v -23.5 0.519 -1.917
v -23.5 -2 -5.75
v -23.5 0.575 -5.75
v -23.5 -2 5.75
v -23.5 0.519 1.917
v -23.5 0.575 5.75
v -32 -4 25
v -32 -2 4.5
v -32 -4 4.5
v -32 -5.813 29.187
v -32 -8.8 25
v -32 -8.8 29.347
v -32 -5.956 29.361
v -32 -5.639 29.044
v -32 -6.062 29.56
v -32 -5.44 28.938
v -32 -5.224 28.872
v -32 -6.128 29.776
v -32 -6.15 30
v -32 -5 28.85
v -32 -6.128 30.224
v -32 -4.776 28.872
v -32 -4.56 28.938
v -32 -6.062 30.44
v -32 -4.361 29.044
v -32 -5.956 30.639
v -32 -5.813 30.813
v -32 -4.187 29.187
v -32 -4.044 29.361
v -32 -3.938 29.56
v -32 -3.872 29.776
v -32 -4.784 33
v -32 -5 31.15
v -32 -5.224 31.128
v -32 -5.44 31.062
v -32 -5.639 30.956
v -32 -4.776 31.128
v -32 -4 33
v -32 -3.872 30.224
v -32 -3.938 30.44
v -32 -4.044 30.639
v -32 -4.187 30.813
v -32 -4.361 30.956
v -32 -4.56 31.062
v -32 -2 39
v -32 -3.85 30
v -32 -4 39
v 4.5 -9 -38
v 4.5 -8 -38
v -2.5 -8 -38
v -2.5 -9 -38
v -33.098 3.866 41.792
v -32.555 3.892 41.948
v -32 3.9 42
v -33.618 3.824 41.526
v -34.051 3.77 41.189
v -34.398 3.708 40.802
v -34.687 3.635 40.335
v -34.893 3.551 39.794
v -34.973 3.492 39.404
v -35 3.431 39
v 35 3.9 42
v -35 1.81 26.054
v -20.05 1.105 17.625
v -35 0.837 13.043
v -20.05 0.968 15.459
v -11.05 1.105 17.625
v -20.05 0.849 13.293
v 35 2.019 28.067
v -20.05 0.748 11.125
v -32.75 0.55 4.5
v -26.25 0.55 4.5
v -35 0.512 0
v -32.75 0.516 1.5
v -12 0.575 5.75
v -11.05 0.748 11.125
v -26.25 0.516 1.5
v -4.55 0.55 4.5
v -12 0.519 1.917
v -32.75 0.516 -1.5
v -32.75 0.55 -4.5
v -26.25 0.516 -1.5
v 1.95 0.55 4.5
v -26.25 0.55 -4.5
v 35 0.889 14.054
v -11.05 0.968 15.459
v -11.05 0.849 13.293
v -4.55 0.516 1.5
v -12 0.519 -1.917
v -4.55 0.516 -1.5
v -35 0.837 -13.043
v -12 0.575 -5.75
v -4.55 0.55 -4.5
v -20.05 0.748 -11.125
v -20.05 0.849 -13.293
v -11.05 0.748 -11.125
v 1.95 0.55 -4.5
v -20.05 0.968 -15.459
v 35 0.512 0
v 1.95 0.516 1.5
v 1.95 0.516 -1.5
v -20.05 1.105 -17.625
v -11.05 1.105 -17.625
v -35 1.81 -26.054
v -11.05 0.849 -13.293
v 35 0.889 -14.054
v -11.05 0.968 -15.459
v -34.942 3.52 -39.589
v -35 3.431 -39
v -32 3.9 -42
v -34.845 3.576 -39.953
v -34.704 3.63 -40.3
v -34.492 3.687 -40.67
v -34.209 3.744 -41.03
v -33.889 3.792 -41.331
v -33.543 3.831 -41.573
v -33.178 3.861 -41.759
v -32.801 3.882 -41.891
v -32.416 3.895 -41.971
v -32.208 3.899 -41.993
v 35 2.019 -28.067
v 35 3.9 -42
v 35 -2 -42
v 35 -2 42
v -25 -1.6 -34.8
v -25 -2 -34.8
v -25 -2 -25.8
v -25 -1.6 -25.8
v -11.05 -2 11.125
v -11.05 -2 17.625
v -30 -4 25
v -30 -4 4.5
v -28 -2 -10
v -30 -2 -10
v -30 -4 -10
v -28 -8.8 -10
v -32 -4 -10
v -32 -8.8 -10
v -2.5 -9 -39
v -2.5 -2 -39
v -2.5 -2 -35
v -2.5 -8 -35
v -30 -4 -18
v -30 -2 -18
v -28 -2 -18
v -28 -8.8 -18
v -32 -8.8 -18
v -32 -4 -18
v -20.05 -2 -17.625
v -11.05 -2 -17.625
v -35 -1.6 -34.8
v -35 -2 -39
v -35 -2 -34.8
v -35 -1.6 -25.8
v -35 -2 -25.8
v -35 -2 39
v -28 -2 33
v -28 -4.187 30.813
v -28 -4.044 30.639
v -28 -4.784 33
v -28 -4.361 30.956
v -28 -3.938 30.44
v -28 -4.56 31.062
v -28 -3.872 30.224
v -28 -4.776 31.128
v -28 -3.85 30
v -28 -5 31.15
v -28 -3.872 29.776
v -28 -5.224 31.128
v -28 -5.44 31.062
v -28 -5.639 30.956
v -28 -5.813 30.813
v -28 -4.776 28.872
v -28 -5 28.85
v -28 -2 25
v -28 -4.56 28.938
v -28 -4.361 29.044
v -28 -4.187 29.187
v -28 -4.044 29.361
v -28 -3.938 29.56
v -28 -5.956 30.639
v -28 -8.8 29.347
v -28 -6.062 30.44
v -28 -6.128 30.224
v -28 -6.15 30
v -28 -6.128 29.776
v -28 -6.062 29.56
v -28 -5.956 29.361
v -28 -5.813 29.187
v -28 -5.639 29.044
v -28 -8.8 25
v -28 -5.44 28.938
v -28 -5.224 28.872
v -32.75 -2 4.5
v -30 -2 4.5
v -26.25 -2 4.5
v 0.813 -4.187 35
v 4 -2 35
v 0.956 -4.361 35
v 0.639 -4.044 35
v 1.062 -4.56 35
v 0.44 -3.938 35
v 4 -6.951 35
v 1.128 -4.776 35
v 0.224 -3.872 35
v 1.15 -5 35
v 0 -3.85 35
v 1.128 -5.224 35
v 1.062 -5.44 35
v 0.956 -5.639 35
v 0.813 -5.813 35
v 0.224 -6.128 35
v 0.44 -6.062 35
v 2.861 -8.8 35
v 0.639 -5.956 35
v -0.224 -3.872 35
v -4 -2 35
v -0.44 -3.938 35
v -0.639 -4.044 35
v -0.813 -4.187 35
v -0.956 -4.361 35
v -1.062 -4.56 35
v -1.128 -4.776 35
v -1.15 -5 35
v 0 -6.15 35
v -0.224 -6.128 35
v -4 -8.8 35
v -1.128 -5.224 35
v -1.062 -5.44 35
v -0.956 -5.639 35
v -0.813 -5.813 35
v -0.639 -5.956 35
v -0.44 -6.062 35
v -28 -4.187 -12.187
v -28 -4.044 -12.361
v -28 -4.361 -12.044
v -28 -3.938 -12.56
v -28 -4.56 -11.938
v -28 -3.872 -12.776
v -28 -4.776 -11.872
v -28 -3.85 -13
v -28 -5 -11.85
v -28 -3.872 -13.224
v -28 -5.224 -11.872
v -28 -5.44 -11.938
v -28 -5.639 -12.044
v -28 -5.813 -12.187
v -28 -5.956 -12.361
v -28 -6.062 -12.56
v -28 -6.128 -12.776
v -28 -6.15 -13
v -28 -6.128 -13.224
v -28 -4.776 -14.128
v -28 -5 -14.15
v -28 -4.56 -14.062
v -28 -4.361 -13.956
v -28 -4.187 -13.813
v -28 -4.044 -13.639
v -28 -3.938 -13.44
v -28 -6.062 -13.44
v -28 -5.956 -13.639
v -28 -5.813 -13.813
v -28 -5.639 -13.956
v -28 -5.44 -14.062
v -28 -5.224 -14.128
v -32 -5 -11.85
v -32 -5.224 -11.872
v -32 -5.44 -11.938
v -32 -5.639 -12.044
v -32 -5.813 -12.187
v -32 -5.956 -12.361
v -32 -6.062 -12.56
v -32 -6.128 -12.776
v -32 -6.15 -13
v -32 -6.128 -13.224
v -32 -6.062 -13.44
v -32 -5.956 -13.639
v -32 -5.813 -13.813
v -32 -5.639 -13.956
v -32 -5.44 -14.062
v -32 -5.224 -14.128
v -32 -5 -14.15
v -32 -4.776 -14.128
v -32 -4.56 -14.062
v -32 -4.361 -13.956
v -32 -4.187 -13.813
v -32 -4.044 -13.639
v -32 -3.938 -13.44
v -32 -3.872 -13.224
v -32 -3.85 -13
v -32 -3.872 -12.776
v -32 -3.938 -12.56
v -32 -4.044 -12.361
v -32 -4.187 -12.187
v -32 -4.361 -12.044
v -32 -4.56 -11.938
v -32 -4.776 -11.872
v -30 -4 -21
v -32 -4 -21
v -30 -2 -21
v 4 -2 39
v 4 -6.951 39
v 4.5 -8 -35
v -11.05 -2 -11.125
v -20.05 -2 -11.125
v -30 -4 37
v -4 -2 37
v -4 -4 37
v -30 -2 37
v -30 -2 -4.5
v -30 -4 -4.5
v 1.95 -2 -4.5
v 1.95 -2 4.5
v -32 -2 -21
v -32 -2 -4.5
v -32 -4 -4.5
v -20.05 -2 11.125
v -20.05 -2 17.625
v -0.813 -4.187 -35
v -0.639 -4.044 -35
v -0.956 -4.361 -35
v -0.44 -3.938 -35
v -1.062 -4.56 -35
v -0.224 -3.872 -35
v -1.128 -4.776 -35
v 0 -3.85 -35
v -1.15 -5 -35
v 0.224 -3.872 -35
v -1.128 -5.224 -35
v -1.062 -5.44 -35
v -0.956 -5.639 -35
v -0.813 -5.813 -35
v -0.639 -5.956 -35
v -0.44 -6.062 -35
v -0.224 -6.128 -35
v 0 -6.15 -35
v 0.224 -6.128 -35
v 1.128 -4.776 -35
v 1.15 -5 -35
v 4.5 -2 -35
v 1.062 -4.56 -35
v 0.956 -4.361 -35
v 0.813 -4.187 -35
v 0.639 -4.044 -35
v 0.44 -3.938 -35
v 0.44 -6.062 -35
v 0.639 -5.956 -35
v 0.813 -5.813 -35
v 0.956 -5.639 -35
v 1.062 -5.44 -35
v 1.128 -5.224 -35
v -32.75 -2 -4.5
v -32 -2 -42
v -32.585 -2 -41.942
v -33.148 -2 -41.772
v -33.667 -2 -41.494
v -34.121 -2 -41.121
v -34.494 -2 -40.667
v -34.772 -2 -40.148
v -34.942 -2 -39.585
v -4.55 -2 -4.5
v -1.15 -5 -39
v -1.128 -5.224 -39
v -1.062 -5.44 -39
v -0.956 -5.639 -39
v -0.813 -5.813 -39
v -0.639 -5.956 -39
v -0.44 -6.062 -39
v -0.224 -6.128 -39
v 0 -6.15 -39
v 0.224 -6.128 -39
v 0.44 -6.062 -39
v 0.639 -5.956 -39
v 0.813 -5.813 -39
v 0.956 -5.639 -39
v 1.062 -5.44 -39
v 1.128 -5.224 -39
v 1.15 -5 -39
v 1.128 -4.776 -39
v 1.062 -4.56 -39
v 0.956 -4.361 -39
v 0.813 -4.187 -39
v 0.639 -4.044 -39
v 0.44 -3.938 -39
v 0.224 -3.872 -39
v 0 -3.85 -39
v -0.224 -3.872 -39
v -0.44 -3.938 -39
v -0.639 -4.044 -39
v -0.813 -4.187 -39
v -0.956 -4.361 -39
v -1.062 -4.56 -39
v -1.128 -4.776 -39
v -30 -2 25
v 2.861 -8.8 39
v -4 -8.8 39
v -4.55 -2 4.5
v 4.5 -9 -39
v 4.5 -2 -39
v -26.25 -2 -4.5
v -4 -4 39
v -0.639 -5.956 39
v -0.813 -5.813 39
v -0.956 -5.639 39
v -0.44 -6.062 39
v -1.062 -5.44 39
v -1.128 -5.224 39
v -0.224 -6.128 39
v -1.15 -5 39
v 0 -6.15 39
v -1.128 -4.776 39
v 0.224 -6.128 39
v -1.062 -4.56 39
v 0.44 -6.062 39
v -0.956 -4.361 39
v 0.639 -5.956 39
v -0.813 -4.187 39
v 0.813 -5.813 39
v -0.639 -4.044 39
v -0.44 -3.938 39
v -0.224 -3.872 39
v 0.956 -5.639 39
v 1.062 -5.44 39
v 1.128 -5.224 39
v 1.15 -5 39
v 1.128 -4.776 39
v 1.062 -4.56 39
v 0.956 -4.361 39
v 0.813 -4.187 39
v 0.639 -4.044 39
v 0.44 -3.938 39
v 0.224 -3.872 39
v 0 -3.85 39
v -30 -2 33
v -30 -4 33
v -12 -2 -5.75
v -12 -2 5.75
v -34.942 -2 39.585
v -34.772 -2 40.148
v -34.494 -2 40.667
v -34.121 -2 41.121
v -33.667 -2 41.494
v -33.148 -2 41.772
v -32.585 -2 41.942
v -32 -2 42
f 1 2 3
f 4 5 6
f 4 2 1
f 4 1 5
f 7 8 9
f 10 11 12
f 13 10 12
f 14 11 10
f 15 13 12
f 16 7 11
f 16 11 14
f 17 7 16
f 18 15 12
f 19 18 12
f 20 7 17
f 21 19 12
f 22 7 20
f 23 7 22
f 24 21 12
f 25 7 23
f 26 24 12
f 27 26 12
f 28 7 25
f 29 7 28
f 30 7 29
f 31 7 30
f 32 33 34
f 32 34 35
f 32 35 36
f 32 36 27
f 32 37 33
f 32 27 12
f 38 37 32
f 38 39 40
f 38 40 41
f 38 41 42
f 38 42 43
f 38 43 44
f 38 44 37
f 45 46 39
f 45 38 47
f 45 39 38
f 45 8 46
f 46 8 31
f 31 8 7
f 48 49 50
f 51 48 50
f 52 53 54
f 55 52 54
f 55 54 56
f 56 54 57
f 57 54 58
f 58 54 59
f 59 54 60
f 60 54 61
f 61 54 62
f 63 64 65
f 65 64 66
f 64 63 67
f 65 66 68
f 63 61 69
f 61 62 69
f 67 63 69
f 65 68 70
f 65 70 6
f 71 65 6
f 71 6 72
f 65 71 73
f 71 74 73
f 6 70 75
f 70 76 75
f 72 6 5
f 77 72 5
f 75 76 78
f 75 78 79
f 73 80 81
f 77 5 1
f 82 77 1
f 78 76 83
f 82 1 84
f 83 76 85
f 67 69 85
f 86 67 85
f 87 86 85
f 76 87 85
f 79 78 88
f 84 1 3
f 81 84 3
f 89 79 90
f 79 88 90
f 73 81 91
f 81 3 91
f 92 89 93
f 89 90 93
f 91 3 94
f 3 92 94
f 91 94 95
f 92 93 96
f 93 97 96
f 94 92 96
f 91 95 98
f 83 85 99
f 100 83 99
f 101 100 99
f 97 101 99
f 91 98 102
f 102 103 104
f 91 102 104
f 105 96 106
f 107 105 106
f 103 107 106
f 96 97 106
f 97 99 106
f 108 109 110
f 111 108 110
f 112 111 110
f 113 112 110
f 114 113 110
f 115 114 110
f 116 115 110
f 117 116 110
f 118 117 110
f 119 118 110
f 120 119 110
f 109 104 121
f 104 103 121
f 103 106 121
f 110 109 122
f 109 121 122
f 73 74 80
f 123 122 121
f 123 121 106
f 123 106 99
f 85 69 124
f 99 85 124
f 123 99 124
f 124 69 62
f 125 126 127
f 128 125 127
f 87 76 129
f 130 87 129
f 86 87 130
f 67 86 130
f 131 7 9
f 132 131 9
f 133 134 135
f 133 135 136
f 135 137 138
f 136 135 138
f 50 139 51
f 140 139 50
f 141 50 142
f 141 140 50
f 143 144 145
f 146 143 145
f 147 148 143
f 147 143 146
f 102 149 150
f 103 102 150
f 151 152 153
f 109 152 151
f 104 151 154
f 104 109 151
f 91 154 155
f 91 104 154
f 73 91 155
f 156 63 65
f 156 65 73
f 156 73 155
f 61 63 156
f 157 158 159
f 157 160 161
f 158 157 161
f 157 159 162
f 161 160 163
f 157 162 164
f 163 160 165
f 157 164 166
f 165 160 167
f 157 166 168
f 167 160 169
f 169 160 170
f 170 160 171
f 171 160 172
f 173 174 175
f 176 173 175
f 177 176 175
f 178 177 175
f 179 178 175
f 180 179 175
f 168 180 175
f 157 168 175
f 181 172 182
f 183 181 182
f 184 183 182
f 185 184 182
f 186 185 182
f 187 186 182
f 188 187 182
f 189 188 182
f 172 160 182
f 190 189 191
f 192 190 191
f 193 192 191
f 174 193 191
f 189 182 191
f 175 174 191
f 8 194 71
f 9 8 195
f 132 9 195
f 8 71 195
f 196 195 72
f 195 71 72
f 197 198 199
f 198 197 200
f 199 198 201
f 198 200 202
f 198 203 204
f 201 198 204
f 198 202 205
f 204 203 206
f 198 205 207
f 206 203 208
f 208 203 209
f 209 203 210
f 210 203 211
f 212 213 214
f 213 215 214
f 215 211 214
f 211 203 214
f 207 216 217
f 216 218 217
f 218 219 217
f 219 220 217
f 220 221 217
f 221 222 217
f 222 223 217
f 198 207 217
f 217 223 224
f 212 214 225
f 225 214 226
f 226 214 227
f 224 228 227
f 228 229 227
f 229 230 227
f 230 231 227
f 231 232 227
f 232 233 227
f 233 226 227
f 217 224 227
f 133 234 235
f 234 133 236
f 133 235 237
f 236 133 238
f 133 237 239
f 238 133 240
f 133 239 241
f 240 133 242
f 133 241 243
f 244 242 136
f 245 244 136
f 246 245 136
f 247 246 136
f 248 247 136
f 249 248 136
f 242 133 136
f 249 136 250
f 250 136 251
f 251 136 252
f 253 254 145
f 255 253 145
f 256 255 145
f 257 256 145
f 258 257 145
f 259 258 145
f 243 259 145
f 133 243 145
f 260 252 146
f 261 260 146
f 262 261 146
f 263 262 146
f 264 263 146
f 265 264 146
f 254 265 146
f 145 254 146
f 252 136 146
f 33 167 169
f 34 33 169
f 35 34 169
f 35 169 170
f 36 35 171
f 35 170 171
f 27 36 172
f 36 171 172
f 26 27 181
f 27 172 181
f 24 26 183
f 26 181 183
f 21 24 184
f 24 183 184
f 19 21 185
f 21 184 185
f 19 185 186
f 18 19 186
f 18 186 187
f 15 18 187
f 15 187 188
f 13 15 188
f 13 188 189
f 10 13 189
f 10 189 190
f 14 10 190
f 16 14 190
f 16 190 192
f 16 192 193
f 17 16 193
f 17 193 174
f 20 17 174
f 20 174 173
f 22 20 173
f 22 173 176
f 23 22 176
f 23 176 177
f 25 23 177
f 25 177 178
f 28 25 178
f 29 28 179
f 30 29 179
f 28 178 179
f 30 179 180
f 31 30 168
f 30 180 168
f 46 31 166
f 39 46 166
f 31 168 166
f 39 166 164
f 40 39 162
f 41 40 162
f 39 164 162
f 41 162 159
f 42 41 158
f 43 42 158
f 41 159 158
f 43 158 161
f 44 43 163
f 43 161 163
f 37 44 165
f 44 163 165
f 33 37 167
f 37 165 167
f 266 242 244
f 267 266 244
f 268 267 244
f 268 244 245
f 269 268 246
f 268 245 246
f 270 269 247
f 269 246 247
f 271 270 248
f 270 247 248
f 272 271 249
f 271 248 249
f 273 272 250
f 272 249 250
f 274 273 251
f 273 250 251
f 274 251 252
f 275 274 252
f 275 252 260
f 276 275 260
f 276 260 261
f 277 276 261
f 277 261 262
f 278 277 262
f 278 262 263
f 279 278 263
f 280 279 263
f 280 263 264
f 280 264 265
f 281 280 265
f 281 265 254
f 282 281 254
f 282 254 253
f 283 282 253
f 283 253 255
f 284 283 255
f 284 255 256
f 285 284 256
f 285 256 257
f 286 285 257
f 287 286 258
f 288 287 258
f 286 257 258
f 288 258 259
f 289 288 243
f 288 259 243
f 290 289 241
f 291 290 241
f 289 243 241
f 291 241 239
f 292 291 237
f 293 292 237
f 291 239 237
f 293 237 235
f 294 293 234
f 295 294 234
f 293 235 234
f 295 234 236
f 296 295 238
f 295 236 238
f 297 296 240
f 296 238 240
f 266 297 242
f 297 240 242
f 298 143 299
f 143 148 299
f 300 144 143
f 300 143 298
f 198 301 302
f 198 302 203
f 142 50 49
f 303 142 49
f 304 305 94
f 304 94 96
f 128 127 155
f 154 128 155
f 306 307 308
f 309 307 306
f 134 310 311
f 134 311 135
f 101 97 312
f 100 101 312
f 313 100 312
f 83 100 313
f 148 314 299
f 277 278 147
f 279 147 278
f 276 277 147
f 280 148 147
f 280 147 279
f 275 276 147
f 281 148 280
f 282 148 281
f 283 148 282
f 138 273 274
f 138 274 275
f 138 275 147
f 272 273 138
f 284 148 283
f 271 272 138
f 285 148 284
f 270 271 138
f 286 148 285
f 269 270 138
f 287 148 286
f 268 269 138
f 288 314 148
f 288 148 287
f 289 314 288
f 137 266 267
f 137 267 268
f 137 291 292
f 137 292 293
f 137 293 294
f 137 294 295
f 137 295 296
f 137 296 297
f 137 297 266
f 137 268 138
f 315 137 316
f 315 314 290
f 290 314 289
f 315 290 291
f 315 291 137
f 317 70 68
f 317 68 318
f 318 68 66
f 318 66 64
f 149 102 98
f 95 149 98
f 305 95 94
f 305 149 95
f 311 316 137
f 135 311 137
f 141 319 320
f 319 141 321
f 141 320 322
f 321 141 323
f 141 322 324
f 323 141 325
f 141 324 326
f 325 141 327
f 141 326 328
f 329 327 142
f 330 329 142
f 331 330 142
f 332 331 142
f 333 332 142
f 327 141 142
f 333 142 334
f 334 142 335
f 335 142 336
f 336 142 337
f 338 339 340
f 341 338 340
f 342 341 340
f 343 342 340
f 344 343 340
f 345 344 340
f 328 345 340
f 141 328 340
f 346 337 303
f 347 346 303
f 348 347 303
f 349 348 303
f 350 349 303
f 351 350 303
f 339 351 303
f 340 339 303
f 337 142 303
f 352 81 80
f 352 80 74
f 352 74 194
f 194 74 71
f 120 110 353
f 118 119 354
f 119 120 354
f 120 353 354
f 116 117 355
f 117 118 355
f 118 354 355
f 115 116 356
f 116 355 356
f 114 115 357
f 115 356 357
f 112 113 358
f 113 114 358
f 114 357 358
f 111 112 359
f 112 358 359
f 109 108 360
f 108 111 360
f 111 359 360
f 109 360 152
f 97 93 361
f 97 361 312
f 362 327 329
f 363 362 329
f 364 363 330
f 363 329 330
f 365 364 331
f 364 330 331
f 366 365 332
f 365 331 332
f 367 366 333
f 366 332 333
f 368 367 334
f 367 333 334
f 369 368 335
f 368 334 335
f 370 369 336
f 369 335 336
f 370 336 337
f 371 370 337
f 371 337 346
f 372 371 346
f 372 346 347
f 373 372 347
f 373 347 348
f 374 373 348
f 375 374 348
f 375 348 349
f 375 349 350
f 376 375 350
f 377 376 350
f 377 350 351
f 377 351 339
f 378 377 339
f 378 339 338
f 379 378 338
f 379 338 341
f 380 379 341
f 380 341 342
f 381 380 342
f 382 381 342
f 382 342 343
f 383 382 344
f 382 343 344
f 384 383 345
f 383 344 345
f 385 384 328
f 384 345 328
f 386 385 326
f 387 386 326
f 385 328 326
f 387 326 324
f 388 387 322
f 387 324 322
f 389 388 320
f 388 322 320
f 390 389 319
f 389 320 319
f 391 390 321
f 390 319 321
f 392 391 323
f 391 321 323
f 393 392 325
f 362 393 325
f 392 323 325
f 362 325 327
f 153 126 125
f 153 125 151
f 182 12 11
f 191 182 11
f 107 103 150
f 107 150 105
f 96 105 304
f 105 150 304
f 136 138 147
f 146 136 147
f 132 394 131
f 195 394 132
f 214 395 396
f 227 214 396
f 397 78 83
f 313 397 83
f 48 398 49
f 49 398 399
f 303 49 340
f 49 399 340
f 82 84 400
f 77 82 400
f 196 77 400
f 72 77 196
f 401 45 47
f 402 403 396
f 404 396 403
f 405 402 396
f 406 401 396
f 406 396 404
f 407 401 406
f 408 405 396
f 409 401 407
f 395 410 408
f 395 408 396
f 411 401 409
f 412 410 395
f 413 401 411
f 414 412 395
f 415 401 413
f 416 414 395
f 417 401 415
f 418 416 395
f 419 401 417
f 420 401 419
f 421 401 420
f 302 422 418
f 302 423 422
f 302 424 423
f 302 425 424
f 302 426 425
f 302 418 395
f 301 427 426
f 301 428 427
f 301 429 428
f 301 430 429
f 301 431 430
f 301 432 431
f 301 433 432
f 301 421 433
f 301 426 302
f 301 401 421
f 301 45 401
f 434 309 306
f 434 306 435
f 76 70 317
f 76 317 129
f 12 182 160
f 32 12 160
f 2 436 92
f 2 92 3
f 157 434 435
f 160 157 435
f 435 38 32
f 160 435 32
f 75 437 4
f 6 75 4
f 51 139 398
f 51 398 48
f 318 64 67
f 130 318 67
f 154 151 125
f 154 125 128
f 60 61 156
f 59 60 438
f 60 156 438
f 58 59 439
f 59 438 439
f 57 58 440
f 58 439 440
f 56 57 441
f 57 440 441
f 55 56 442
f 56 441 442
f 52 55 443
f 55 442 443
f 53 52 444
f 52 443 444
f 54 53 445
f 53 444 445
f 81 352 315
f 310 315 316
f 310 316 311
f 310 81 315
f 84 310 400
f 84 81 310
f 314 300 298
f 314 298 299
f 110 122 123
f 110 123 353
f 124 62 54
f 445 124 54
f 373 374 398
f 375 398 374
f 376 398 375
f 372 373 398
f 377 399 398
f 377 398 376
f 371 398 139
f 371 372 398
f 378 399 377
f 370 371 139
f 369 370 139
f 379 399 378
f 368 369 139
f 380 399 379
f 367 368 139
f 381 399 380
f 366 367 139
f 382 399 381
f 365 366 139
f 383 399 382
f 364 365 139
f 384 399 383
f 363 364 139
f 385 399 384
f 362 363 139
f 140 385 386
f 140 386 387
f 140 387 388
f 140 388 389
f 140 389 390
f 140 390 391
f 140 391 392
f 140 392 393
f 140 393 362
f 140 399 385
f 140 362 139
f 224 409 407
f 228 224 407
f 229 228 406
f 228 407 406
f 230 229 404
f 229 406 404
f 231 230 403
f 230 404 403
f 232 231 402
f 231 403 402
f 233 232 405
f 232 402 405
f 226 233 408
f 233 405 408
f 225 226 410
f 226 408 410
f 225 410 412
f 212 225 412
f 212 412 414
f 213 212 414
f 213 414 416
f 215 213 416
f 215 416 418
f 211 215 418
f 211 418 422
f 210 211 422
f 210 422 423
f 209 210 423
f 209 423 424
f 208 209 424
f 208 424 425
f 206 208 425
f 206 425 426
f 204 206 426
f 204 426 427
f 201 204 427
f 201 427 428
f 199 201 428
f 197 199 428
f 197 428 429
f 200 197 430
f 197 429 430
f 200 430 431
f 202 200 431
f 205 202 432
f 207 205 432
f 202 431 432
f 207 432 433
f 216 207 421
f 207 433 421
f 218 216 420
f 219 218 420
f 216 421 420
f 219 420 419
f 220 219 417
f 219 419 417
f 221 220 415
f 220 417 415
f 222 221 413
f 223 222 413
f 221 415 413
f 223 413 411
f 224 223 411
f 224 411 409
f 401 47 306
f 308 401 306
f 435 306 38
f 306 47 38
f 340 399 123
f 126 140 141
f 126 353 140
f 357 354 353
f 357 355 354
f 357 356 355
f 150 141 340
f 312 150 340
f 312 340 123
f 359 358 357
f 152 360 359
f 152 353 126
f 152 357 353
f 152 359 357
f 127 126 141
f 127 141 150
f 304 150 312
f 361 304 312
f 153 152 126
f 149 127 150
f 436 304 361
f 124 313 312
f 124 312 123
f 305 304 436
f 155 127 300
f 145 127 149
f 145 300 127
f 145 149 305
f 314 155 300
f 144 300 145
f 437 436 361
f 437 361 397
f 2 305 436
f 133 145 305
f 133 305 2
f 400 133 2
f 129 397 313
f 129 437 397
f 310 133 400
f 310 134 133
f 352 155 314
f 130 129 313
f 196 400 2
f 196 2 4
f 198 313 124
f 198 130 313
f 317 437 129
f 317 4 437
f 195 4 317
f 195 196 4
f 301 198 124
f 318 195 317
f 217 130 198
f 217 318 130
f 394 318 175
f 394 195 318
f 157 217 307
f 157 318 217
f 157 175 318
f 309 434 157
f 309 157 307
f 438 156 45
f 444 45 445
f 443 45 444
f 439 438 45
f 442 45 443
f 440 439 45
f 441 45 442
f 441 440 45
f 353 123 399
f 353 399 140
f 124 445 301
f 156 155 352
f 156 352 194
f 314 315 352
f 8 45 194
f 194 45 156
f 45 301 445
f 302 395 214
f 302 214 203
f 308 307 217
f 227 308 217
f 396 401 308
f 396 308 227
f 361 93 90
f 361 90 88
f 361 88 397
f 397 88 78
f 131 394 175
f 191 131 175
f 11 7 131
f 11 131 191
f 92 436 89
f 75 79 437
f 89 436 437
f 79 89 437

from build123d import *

# Parameters (mm, degrees)
SKETCH009_W             = 84
SKETCH009_H             = 70
PAD002_DEPTH            = 2
SKETCH010_W             = 2
SKETCH010_H             = 7
PAD003_DEPTH            = 2
SKETCH012_W             = 8
SKETCH012_H             = 6.8
PAD004_DEPTH            = 4
SKETCH013_W             = 7
SKETCH013_H             = 6
PAD005_DEPTH            = 4
SKETCH011_W             = 8
SKETCH011_H             = 6.8
PAD006_DEPTH            = 4
SKETCH014_R             = 1.15
POCKET002_DEPTH         = 81.001
SKETCH016_R             = 1.15
POCKET003_DEPTH         = 8.501
SKETCH018_W             = 11.5
SKETCH018_H             = 11.5
POCKET004_DEPTH         = 5
POCKET005_DEPTH         = 5
POCKET006_DEPTH         = 5
SKETCH021_W             = 1
SKETCH021_H             = 7
PAD007_DEPTH            = 1
SKETCH022_W             = 9
SKETCH022_H             = 10
POCKET007_DEPTH         = 0.4
FILLET_R                = 3
BODY002_PITCH_ANGLE     = -90
BODY002_PLACEMENT_ANGLE = 90
PAD001_DEPTH            = 35
SKETCH007_W             = 11.5
SKETCH007_H             = 11.5
POCKET001_DEPTH         = 13
FILLET001_R             = 3
SKETCH025_W             = 6.5
SKETCH025_H             = 9
SKETCH025_W_2           = 9
SKETCH025_H_2           = 6.5
POCKET008_DEPTH         = 8


with BuildPart() as back:
    # Sketch009 → Pad002 (new body)
    with BuildSketch(Plane.XY):
        Rectangle(SKETCH009_W, SKETCH009_H)
    extrude(amount=PAD002_DEPTH)

    # Sketch010 (on Face6 of Pad002) → Pad003 (join)
    with BuildSketch(Plane.XY.offset(2)):
        with Locations((-38, -1)):
            Rectangle(SKETCH010_W, SKETCH010_H)
        Polygon((-21, 32), (39, 32), (39, -4), (37, -4), (37, 30), (-21, 30), align=None)
    extrude(amount=PAD003_DEPTH)

    # Sketch012 (on Face15 of Pad003) → Pad004 (join)
    with BuildSketch(Plane.YZ.offset(39)):
        with Locations((0, 5.4)):
            Rectangle(SKETCH012_W, SKETCH012_H)
    extrude(amount=-PAD004_DEPTH)

    # Sketch013 (on Face9 of Pad004) → Pad005 (join)
    with BuildSketch(Plane(origin=(-39, 0, 0), x_dir=(0, -1, 0), z_dir=(-1, 0, 0))):
        with Locations((1, 5)):
            Rectangle(SKETCH013_W, SKETCH013_H)
    extrude(amount=-PAD005_DEPTH)

    # Sketch011 (on Face16 of Pad003) → Pad006 (join)
    with BuildSketch(Plane(origin=(0, 32, 0), x_dir=(-1, 0, 0), z_dir=(0, 1, 0))):
        with Locations((-29, 5.4)):
            Rectangle(SKETCH011_W, SKETCH011_H)
        with Locations((14, 5.4)):
            Rectangle(SKETCH011_W, SKETCH011_H)
    extrude(amount=-PAD006_DEPTH)

    # Sketch014 (on Face44 of Pad006) → Pocket002 (cut, through all)
    with BuildSketch(Plane.YZ.offset(39)):
        with Locations((0, 5)):
            Circle(SKETCH014_R)
    extrude(amount=-POCKET002_DEPTH, mode=Mode.SUBTRACT)

    # Sketch016 → Pocket003 (cut, through all)
    with BuildSketch(Plane.XZ.offset(-26.5)):
        with Locations((-13, 5)):
            Circle(SKETCH016_R)
        with Locations((30, 5)):
            Circle(SKETCH016_R)
    extrude(amount=-POCKET003_DEPTH, mode=Mode.SUBTRACT)

    # Sketch018 (on Face5 of Pocket003) → Pocket004 (cut)
    with BuildSketch(Plane.XY.offset(2)):
        with Locations((0, 17.75)):
            Rectangle(SKETCH018_W, SKETCH018_H)
    extrude(amount=-POCKET004_DEPTH, mode=Mode.SUBTRACT)

    # Sketch019 (on Face31 of Pocket004) → Pocket005 (cut)
    with BuildSketch(Plane.XZ.offset(-28)):
        Polygon((29.125944, 9.042901), (33.258869, 4.499726), (33.258869, 9.042901), align=None)
    extrude(amount=-POCKET005_DEPTH, mode=Mode.SUBTRACT)

    # Sketch020 (on Face36 of Pocket005) → Pocket006 (cut)
    with BuildSketch(Plane(origin=(35, 0, 0), x_dir=(0, -1, 0), z_dir=(-1, 0, 0))):
        Polygon((2.77547, 8.938441), (6.386171, 3.079567), (6.386171, 8.938441), align=None)
    extrude(amount=-POCKET006_DEPTH, mode=Mode.SUBTRACT)

    # Sketch021 (on Face40 of Pocket006) → Pad007 (join)
    with BuildSketch(Plane.XY.offset(8)):
        with Locations((-38.5, -1)):
            Rectangle(SKETCH021_W, SKETCH021_H)
    extrude(amount=PAD007_DEPTH)

    # Sketch022 (on Face5 of Pocket005) → Pocket007 (cut)
    with BuildSketch(Plane.XY.offset(2)):
        with Locations((-30.3, 30)):
            Rectangle(SKETCH022_W, SKETCH022_H)
    extrude(amount=-POCKET007_DEPTH, mode=Mode.SUBTRACT)

    # Fillet
    fillet_edges = [back.edges().sort_by_distance(p)[0] for p in [
        (42, 35, 1),
        (-42, 35, 1),
    ]]
    fillet(fillet_edges, radius=FILLET_R)


with BuildPart() as back_1:
    # Body002 pitch: moved
    add(back.part.rotate(Axis((0, 0, 0), (0, 1, 0)), BODY002_PITCH_ANGLE))


with BuildPart() as back_2:
    # Body002 placement: moved
    add(back_1.part.rotate(Axis((0, 0, 0), (0, 0, 1)), BODY002_PLACEMENT_ANGLE))


with BuildPart() as curve:
    # Sketch006 → Pad001 (new body, symmetric)
    with BuildSketch(Plane(origin=(0, 0, 0), x_dir=(0, 0, -1), z_dir=(1, 0, 0))):
        with BuildLine():
            ThreePointArc((-42, 3.9), (0, 0.511678), (42, 3.9))
            Line((42, -0.1), (42, 3.9))
            Line((-42, -0.1), (42, -0.1))
            Line((-42, 3.9), (-42, -0.1))
        make_face()
    extrude(amount=PAD001_DEPTH, both=True)

    # Sketch007 (on Face3 of Pad001) → Pocket001 (cut)
    with BuildSketch(Plane.XZ.offset(0.1)):
        with Locations((-17.75, 0)):
            Rectangle(SKETCH007_W, SKETCH007_H)
    extrude(amount=-POCKET001_DEPTH, mode=Mode.SUBTRACT)

    # Fillet001
    fillet001_edges = [curve.edges().sort_by_distance(p)[0] for p in [
        (-35, 1.9, -42),
        (-35, 1.9, 42),
    ]]
    fillet(fillet001_edges, radius=FILLET001_R)

    # Boolean: union Back
    add(back_2.part)

    # Sketch025 (on Face32 of Boolean) → Pocket008 (cut, symmetric)
    with BuildSketch(Plane.XZ.offset(2)):
        with Locations((-29.5, 0)):
            Rectangle(SKETCH025_W, SKETCH025_H)
        with Locations((-15.55, 14.375)):
            Rectangle(SKETCH025_W_2, SKETCH025_H_2)
        with Locations((-1.3, 0)):
            Rectangle(SKETCH025_W, SKETCH025_H)
        with Locations((-15.55, -14.375)):
            Rectangle(SKETCH025_W_2, SKETCH025_H_2)
    extrude(amount=POCKET008_DEPTH, both=True, mode=Mode.SUBTRACT)


solid = curve.part
